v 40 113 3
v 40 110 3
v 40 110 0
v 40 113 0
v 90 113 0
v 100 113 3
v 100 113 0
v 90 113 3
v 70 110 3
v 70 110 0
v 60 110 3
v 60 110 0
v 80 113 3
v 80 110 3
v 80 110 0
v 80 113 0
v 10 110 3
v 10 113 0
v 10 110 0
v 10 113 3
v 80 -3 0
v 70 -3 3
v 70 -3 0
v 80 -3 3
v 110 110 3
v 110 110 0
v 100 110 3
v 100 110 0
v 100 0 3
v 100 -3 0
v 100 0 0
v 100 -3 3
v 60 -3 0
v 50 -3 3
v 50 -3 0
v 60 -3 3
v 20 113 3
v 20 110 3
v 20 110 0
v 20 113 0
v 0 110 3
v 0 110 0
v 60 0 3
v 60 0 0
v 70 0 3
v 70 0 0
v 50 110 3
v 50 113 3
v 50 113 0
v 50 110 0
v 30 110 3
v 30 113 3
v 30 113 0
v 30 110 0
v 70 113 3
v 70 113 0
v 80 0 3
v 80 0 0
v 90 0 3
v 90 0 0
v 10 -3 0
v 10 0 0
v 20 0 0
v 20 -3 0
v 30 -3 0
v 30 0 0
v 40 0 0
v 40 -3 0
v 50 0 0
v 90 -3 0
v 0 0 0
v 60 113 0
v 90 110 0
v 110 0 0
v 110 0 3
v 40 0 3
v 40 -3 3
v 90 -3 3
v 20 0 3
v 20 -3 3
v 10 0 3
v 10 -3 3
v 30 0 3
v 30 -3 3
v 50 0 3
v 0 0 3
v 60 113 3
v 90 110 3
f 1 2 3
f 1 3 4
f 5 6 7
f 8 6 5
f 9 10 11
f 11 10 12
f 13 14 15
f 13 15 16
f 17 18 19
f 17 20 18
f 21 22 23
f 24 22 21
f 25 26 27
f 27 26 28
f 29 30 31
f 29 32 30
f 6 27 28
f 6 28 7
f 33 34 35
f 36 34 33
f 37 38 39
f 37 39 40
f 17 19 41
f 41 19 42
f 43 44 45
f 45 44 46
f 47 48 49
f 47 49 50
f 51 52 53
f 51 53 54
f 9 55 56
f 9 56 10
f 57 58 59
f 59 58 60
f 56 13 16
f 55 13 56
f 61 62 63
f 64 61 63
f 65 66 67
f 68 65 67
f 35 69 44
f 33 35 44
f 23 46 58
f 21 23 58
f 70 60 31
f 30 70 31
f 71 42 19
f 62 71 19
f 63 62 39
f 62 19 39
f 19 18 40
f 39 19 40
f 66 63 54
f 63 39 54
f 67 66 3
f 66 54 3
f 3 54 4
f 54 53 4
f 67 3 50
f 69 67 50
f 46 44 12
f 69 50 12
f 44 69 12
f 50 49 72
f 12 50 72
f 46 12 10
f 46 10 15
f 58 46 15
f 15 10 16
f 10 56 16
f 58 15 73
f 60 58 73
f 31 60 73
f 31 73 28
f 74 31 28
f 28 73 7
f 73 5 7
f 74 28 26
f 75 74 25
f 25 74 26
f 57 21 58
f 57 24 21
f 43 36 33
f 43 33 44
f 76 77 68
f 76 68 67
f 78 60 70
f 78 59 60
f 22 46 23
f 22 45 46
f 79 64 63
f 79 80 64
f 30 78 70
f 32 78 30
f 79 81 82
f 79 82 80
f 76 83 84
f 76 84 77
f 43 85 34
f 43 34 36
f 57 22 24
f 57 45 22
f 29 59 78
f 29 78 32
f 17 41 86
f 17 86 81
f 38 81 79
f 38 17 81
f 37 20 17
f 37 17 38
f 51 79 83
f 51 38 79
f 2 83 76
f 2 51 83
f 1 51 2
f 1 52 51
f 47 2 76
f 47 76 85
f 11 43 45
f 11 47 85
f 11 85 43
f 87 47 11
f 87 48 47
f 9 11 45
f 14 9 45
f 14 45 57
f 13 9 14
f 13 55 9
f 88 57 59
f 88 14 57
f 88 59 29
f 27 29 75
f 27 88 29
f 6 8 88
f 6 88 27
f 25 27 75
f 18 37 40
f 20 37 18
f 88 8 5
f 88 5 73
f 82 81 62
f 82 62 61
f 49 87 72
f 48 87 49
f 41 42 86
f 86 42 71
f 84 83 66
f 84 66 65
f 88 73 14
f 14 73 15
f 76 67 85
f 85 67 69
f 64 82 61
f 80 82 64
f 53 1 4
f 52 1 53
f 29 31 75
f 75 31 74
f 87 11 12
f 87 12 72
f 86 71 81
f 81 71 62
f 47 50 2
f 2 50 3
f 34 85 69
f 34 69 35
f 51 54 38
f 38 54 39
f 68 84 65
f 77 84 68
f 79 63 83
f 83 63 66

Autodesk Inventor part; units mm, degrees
ref_plane "YZ Plane" through (0, 0, 0) normal (1, 0, 0) x (0, 1, 0)
ref_plane "XZ Plane" through (0, 0, 0) normal (0, 1, 0) x (-1, 0, 0)
ref_plane "XY Plane" through (0, 0, 0) normal (0, 0, 1) x (1, 0, 0)
sketch "Sketch1" plane through (0, 0, 0) normal (0, 0, 1) x (1, 0, 0)
  line L0 (0, 0) -> (110, 0)
  line L1 (110, 0) -> (110, 110)
  line L2 (110, 110) -> (0, 110)
  line L3 (0, 110) -> (0, 0)
  dimension "d0" = 110
  dimension "d1" = 110
extrude "Extrusion1" add sketch "Sketch1" along normal blind 3
sketch "Sketch2" plane through (0, 0, 3) normal (0, 0, 1) x (1, 0, 0)
  line L0 (110, 110) -> (0, 110) projected
  line L1 (10, 110) -> (20, 110)
  line L2 (20, 110) -> (20, 113)
  line L3 (20, 113) -> (10, 113)
  line L4 (10, 113) -> (10, 110)
  line L5 (30, 110) -> (40, 110)
  line L6 (40, 110) -> (40, 113)
  line L7 (40, 113) -> (30, 113)
  line L8 (30, 113) -> (30, 110)
  line L9 (50, 110) -> (60, 110)
  line L10 (60, 110) -> (60, 113)
  line L11 (60, 113) -> (50, 113)
  line L12 (50, 113) -> (50, 110)
  line L13 (70, 110) -> (80, 110)
  line L14 (80, 110) -> (80, 113)
  line L15 (80, 113) -> (70, 113)
  line L16 (70, 113) -> (70, 110)
  line L17 (90, 110) -> (100, 110)
  line L18 (100, 110) -> (100, 113)
  line L19 (100, 113) -> (90, 113)
  line L20 (90, 113) -> (90, 110)
  line L21 (0, 110) -> (0, 0) projected
  line L22 (10, -3) -> (20, -3)
  line L23 (20, -3) -> (20, 0)
  line L24 (20, 0) -> (10, 0)
  line L25 (10, 0) -> (10, -3)
  line L26 (30, -3) -> (40, -3)
  line L27 (40, -3) -> (40, 0)
  line L28 (40, 0) -> (30, 0)
  line L29 (30, 0) -> (30, -3)
  line L30 (50, -3) -> (60, -3)
  line L31 (60, -3) -> (60, 0)
  line L32 (60, 0) -> (50, 0)
  line L33 (50, 0) -> (50, -3)
  line L34 (70, -3) -> (80, -3)
  line L35 (80, -3) -> (80, 0)
  line L36 (80, 0) -> (70, 0)
  line L37 (70, 0) -> (70, -3)
  line L38 (90, -3) -> (100, -3)
  line L39 (100, -3) -> (100, 0)
  line L40 (100, 0) -> (90, 0)
  line L41 (90, 0) -> (90, -3)
  dimension "d4" = 10
  dimension "d5" = 3
  dimension "d6" = 10
  dimension "d9" = 20
  dimension "d12" = 113
extrude "Extrusion2" add sketch "Sketch2" against normal blind 3
sketch "Sketch3" plane through (0, 0, 3) normal (0, 0, 1) x (1, 0, 0)
  point P0 (0, 0)
properties part number "Techopantalla"
